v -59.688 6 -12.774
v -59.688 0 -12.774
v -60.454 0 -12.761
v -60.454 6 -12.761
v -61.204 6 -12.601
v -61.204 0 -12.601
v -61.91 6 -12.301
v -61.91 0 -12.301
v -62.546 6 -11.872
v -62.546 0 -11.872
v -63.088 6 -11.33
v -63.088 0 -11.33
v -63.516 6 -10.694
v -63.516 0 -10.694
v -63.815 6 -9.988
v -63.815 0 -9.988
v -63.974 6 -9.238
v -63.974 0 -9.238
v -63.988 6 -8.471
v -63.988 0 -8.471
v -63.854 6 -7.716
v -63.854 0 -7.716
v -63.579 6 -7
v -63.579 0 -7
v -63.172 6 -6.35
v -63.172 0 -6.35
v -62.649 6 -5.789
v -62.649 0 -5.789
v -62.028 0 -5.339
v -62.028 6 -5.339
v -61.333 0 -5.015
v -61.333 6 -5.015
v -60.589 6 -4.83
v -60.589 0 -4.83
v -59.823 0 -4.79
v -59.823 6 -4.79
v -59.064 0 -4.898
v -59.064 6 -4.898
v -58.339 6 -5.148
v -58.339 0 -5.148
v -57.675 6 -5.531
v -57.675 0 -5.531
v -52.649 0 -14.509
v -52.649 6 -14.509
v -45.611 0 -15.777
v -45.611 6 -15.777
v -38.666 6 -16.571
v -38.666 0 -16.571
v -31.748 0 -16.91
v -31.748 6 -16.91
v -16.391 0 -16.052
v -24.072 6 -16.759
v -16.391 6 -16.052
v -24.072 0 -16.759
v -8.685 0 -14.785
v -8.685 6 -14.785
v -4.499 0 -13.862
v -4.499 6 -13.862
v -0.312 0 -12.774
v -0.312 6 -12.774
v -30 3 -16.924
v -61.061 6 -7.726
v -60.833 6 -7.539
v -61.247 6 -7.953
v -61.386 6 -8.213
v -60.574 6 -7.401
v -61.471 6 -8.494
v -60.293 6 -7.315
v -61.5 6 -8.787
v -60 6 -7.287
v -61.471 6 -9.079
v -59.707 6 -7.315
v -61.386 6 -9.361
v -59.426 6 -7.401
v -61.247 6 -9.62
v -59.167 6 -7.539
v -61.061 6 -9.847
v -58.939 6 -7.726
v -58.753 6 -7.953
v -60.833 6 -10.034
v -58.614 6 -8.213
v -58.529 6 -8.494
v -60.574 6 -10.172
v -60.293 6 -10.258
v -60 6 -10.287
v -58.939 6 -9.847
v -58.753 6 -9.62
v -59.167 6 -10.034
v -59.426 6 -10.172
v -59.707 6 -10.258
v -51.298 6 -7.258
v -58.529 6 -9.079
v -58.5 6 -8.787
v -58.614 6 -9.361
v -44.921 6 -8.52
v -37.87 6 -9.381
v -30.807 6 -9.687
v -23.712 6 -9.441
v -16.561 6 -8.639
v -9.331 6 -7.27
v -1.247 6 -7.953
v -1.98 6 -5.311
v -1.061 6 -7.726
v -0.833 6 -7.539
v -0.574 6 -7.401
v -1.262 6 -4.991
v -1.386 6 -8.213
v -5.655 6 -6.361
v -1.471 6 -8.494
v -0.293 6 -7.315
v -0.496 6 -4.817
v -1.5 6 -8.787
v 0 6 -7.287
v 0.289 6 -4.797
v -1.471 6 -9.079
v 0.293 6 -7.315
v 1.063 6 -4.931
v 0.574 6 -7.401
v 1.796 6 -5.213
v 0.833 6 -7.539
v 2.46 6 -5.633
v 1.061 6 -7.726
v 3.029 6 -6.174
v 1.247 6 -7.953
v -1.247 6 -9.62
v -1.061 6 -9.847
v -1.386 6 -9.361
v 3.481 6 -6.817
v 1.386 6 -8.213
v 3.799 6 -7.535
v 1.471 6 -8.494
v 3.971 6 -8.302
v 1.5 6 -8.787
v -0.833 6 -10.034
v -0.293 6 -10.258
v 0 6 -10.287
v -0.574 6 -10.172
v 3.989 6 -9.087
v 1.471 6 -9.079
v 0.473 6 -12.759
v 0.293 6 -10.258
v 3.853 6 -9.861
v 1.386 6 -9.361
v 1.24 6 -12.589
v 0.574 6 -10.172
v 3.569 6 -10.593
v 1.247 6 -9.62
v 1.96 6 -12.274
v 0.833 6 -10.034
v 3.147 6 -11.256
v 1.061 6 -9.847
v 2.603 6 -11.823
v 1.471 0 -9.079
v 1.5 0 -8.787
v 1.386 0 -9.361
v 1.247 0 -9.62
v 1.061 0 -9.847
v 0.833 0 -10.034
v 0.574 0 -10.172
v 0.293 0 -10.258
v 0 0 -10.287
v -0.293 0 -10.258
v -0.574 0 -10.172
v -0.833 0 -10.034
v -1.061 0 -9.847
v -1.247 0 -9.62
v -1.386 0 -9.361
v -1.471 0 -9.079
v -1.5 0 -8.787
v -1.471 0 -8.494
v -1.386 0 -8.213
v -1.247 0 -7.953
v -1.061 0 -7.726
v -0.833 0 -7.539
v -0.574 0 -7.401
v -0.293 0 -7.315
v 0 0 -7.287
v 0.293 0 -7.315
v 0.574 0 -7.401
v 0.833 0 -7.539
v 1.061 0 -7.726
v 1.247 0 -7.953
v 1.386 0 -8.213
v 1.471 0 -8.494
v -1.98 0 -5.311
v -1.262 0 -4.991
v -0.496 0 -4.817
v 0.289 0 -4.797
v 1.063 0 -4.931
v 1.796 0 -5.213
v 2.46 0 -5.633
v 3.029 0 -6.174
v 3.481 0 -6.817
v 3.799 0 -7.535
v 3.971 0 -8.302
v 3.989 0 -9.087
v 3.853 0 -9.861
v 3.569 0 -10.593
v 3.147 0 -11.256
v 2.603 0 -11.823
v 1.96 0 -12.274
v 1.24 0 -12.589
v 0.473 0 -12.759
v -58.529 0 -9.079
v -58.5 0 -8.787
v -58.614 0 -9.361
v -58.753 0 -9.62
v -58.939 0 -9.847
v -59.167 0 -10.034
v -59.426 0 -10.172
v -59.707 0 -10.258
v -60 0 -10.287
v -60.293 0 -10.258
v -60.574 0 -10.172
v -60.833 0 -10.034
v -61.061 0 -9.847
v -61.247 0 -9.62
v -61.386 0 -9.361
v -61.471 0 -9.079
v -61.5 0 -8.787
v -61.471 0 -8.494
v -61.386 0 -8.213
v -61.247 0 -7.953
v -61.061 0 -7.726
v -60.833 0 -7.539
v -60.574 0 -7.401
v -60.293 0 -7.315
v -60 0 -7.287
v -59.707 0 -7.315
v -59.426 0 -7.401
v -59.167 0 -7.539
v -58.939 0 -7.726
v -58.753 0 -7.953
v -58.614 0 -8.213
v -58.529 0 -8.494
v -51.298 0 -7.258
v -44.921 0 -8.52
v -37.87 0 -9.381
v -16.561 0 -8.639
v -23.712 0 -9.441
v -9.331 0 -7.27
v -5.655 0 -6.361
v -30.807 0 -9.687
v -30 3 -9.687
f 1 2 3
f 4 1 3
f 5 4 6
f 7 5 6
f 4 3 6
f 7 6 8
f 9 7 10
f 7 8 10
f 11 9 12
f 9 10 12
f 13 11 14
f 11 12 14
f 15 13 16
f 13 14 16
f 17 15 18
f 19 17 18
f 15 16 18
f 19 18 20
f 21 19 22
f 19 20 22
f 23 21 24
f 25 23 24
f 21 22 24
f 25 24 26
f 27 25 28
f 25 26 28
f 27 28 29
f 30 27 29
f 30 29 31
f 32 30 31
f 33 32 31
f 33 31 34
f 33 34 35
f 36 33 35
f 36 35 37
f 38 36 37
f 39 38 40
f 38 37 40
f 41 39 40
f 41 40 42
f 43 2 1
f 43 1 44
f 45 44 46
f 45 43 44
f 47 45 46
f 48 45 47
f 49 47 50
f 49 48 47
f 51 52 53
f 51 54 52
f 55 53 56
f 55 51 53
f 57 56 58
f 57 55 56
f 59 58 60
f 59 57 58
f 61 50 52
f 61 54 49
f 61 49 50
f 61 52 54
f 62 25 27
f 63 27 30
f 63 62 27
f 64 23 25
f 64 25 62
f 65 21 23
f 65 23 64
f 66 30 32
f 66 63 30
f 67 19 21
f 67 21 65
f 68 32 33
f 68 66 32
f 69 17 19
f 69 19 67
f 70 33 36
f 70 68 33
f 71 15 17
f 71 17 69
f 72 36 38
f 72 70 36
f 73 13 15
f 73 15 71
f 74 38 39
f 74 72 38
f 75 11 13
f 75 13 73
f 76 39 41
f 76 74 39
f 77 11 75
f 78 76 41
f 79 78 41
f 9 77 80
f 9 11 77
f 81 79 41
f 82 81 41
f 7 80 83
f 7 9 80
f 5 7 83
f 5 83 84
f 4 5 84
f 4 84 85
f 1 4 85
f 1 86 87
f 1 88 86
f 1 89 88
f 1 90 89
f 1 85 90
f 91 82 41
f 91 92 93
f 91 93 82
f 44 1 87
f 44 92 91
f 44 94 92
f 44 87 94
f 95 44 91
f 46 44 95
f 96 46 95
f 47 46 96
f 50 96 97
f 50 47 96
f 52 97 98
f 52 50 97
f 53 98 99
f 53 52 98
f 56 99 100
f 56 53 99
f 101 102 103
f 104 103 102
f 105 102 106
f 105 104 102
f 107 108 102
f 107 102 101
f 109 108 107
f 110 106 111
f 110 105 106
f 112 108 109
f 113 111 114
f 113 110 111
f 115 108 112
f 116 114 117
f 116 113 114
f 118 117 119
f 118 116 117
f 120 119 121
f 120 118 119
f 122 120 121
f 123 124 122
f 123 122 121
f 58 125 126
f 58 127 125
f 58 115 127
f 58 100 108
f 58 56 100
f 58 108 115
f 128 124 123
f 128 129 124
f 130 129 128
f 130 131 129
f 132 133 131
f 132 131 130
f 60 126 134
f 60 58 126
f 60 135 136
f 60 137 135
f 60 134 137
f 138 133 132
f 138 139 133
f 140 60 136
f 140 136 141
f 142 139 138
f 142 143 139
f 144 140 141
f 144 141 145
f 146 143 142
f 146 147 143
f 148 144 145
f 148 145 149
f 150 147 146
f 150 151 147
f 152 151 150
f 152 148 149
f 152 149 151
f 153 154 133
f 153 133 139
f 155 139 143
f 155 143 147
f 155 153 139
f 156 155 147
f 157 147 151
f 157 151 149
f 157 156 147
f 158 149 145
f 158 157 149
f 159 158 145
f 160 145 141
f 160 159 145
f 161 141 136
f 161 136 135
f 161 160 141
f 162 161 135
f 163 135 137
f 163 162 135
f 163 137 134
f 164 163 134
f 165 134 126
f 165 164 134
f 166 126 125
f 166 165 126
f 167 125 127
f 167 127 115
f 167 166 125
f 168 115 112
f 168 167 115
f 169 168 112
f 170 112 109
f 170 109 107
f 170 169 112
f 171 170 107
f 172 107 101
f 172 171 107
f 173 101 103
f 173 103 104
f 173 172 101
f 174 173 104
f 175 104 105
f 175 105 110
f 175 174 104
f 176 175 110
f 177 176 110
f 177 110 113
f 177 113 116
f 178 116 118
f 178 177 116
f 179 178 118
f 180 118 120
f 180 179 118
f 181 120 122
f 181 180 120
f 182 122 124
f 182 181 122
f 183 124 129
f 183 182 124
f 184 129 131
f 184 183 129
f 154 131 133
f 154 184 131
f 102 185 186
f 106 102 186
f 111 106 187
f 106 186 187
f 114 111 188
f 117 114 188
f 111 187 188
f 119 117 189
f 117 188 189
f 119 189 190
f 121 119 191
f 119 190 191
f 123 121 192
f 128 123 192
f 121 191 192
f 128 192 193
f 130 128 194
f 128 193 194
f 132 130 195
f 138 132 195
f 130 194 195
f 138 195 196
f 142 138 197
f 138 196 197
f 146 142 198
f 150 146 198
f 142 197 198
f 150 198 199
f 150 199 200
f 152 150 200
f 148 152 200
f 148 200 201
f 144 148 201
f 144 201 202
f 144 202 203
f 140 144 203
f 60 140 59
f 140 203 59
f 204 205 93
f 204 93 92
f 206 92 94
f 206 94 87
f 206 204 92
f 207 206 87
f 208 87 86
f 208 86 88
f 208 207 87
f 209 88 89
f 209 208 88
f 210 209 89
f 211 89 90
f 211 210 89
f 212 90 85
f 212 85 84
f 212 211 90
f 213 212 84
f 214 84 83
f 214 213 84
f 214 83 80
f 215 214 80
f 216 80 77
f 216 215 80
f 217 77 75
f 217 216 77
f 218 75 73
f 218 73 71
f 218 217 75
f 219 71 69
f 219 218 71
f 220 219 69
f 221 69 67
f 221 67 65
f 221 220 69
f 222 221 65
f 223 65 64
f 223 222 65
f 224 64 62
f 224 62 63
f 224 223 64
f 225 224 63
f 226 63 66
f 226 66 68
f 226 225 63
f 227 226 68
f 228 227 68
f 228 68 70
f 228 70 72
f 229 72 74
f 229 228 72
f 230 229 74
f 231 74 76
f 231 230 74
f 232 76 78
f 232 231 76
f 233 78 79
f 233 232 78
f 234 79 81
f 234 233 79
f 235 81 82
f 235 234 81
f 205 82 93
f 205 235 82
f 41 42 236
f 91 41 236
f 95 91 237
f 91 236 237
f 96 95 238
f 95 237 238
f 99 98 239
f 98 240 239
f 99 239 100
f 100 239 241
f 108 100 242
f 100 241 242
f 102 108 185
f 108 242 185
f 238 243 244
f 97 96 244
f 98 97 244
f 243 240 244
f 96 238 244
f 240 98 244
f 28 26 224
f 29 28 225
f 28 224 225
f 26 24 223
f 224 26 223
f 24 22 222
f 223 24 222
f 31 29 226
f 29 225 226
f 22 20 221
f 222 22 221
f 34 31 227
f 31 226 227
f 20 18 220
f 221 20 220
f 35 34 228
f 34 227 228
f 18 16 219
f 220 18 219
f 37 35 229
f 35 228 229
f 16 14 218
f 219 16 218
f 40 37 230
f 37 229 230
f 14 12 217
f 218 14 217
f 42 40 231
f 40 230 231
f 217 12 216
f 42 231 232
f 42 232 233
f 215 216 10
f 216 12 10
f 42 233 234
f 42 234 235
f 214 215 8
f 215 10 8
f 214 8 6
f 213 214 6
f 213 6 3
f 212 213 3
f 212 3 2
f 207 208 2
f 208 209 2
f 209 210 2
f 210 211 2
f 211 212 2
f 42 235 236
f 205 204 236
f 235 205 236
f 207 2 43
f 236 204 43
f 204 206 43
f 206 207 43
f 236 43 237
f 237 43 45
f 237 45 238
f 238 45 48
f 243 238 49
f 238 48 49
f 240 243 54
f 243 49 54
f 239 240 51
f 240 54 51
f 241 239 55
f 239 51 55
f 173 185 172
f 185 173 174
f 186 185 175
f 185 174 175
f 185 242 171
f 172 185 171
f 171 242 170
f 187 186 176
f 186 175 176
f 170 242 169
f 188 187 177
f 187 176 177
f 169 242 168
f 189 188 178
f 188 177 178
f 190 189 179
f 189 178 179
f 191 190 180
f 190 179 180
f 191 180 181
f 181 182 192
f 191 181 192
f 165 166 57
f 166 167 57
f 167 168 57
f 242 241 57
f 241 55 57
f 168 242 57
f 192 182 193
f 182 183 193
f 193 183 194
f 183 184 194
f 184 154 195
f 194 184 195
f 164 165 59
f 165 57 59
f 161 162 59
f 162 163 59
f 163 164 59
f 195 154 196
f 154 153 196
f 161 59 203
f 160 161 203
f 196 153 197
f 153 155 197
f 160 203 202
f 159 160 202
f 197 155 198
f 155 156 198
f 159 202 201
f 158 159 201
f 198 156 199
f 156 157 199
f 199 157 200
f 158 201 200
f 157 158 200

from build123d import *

# Parameters (mm, degrees)
SKETCH1_R           = 1.5
BOSS_EXTRUDE1_DEPTH = 6


with BuildPart() as part:
    # Sketch1 → Boss-Extrude1 (new body)
    with BuildSketch(Plane(origin=(0, 0, 0), x_dir=(1, 0, 0), z_dir=(0, 1, 0))):
        with BuildLine():
            ThreePointArc((-59.687638113, 12.774374027), (-63.854017455, 7.715818425), (-57.675322321, 5.531458557))
            add(Edge.make_bspline(
                [(-57.675322321, 5.531458557), (-48.450214881, 8.368212133), (-29.885063183, 11.107920581), (-11.319911486, 8.159941585), (-1.979867229, 5.310941391)],
                knots=[0.038744628, 0.038744628, 0.038744628, 0.038744628, 0.5, 0.967002213, 0.967002213, 0.967002213, 0.967002213], degree=3))
            ThreePointArc((-1.979867229, 5.310941391), (3.903752715, 7.914399297), (-0.312361887, 12.774374027))
            add(Edge.make_bspline(
                [(-59.687638113, 12.774374027), (-49.791758742, 15.54092351), (-30, 18.307472992), (-10.208241258, 15.54092351), (-0.312361887, 12.774374027)],
                knots=[0.005206031, 0.005206031, 0.005206031, 0.005206031, 0.5, 0.994793969, 0.994793969, 0.994793969, 0.994793969], degree=3))
        make_face()
        with Locations((-60, 8.786588921)):
            Circle(SKETCH1_R, mode=Mode.SUBTRACT)
        with Locations((0, 8.786588921)):
            Circle(SKETCH1_R, mode=Mode.SUBTRACT)
    extrude(amount=BOSS_EXTRUDE1_DEPTH)


solid = part.part
